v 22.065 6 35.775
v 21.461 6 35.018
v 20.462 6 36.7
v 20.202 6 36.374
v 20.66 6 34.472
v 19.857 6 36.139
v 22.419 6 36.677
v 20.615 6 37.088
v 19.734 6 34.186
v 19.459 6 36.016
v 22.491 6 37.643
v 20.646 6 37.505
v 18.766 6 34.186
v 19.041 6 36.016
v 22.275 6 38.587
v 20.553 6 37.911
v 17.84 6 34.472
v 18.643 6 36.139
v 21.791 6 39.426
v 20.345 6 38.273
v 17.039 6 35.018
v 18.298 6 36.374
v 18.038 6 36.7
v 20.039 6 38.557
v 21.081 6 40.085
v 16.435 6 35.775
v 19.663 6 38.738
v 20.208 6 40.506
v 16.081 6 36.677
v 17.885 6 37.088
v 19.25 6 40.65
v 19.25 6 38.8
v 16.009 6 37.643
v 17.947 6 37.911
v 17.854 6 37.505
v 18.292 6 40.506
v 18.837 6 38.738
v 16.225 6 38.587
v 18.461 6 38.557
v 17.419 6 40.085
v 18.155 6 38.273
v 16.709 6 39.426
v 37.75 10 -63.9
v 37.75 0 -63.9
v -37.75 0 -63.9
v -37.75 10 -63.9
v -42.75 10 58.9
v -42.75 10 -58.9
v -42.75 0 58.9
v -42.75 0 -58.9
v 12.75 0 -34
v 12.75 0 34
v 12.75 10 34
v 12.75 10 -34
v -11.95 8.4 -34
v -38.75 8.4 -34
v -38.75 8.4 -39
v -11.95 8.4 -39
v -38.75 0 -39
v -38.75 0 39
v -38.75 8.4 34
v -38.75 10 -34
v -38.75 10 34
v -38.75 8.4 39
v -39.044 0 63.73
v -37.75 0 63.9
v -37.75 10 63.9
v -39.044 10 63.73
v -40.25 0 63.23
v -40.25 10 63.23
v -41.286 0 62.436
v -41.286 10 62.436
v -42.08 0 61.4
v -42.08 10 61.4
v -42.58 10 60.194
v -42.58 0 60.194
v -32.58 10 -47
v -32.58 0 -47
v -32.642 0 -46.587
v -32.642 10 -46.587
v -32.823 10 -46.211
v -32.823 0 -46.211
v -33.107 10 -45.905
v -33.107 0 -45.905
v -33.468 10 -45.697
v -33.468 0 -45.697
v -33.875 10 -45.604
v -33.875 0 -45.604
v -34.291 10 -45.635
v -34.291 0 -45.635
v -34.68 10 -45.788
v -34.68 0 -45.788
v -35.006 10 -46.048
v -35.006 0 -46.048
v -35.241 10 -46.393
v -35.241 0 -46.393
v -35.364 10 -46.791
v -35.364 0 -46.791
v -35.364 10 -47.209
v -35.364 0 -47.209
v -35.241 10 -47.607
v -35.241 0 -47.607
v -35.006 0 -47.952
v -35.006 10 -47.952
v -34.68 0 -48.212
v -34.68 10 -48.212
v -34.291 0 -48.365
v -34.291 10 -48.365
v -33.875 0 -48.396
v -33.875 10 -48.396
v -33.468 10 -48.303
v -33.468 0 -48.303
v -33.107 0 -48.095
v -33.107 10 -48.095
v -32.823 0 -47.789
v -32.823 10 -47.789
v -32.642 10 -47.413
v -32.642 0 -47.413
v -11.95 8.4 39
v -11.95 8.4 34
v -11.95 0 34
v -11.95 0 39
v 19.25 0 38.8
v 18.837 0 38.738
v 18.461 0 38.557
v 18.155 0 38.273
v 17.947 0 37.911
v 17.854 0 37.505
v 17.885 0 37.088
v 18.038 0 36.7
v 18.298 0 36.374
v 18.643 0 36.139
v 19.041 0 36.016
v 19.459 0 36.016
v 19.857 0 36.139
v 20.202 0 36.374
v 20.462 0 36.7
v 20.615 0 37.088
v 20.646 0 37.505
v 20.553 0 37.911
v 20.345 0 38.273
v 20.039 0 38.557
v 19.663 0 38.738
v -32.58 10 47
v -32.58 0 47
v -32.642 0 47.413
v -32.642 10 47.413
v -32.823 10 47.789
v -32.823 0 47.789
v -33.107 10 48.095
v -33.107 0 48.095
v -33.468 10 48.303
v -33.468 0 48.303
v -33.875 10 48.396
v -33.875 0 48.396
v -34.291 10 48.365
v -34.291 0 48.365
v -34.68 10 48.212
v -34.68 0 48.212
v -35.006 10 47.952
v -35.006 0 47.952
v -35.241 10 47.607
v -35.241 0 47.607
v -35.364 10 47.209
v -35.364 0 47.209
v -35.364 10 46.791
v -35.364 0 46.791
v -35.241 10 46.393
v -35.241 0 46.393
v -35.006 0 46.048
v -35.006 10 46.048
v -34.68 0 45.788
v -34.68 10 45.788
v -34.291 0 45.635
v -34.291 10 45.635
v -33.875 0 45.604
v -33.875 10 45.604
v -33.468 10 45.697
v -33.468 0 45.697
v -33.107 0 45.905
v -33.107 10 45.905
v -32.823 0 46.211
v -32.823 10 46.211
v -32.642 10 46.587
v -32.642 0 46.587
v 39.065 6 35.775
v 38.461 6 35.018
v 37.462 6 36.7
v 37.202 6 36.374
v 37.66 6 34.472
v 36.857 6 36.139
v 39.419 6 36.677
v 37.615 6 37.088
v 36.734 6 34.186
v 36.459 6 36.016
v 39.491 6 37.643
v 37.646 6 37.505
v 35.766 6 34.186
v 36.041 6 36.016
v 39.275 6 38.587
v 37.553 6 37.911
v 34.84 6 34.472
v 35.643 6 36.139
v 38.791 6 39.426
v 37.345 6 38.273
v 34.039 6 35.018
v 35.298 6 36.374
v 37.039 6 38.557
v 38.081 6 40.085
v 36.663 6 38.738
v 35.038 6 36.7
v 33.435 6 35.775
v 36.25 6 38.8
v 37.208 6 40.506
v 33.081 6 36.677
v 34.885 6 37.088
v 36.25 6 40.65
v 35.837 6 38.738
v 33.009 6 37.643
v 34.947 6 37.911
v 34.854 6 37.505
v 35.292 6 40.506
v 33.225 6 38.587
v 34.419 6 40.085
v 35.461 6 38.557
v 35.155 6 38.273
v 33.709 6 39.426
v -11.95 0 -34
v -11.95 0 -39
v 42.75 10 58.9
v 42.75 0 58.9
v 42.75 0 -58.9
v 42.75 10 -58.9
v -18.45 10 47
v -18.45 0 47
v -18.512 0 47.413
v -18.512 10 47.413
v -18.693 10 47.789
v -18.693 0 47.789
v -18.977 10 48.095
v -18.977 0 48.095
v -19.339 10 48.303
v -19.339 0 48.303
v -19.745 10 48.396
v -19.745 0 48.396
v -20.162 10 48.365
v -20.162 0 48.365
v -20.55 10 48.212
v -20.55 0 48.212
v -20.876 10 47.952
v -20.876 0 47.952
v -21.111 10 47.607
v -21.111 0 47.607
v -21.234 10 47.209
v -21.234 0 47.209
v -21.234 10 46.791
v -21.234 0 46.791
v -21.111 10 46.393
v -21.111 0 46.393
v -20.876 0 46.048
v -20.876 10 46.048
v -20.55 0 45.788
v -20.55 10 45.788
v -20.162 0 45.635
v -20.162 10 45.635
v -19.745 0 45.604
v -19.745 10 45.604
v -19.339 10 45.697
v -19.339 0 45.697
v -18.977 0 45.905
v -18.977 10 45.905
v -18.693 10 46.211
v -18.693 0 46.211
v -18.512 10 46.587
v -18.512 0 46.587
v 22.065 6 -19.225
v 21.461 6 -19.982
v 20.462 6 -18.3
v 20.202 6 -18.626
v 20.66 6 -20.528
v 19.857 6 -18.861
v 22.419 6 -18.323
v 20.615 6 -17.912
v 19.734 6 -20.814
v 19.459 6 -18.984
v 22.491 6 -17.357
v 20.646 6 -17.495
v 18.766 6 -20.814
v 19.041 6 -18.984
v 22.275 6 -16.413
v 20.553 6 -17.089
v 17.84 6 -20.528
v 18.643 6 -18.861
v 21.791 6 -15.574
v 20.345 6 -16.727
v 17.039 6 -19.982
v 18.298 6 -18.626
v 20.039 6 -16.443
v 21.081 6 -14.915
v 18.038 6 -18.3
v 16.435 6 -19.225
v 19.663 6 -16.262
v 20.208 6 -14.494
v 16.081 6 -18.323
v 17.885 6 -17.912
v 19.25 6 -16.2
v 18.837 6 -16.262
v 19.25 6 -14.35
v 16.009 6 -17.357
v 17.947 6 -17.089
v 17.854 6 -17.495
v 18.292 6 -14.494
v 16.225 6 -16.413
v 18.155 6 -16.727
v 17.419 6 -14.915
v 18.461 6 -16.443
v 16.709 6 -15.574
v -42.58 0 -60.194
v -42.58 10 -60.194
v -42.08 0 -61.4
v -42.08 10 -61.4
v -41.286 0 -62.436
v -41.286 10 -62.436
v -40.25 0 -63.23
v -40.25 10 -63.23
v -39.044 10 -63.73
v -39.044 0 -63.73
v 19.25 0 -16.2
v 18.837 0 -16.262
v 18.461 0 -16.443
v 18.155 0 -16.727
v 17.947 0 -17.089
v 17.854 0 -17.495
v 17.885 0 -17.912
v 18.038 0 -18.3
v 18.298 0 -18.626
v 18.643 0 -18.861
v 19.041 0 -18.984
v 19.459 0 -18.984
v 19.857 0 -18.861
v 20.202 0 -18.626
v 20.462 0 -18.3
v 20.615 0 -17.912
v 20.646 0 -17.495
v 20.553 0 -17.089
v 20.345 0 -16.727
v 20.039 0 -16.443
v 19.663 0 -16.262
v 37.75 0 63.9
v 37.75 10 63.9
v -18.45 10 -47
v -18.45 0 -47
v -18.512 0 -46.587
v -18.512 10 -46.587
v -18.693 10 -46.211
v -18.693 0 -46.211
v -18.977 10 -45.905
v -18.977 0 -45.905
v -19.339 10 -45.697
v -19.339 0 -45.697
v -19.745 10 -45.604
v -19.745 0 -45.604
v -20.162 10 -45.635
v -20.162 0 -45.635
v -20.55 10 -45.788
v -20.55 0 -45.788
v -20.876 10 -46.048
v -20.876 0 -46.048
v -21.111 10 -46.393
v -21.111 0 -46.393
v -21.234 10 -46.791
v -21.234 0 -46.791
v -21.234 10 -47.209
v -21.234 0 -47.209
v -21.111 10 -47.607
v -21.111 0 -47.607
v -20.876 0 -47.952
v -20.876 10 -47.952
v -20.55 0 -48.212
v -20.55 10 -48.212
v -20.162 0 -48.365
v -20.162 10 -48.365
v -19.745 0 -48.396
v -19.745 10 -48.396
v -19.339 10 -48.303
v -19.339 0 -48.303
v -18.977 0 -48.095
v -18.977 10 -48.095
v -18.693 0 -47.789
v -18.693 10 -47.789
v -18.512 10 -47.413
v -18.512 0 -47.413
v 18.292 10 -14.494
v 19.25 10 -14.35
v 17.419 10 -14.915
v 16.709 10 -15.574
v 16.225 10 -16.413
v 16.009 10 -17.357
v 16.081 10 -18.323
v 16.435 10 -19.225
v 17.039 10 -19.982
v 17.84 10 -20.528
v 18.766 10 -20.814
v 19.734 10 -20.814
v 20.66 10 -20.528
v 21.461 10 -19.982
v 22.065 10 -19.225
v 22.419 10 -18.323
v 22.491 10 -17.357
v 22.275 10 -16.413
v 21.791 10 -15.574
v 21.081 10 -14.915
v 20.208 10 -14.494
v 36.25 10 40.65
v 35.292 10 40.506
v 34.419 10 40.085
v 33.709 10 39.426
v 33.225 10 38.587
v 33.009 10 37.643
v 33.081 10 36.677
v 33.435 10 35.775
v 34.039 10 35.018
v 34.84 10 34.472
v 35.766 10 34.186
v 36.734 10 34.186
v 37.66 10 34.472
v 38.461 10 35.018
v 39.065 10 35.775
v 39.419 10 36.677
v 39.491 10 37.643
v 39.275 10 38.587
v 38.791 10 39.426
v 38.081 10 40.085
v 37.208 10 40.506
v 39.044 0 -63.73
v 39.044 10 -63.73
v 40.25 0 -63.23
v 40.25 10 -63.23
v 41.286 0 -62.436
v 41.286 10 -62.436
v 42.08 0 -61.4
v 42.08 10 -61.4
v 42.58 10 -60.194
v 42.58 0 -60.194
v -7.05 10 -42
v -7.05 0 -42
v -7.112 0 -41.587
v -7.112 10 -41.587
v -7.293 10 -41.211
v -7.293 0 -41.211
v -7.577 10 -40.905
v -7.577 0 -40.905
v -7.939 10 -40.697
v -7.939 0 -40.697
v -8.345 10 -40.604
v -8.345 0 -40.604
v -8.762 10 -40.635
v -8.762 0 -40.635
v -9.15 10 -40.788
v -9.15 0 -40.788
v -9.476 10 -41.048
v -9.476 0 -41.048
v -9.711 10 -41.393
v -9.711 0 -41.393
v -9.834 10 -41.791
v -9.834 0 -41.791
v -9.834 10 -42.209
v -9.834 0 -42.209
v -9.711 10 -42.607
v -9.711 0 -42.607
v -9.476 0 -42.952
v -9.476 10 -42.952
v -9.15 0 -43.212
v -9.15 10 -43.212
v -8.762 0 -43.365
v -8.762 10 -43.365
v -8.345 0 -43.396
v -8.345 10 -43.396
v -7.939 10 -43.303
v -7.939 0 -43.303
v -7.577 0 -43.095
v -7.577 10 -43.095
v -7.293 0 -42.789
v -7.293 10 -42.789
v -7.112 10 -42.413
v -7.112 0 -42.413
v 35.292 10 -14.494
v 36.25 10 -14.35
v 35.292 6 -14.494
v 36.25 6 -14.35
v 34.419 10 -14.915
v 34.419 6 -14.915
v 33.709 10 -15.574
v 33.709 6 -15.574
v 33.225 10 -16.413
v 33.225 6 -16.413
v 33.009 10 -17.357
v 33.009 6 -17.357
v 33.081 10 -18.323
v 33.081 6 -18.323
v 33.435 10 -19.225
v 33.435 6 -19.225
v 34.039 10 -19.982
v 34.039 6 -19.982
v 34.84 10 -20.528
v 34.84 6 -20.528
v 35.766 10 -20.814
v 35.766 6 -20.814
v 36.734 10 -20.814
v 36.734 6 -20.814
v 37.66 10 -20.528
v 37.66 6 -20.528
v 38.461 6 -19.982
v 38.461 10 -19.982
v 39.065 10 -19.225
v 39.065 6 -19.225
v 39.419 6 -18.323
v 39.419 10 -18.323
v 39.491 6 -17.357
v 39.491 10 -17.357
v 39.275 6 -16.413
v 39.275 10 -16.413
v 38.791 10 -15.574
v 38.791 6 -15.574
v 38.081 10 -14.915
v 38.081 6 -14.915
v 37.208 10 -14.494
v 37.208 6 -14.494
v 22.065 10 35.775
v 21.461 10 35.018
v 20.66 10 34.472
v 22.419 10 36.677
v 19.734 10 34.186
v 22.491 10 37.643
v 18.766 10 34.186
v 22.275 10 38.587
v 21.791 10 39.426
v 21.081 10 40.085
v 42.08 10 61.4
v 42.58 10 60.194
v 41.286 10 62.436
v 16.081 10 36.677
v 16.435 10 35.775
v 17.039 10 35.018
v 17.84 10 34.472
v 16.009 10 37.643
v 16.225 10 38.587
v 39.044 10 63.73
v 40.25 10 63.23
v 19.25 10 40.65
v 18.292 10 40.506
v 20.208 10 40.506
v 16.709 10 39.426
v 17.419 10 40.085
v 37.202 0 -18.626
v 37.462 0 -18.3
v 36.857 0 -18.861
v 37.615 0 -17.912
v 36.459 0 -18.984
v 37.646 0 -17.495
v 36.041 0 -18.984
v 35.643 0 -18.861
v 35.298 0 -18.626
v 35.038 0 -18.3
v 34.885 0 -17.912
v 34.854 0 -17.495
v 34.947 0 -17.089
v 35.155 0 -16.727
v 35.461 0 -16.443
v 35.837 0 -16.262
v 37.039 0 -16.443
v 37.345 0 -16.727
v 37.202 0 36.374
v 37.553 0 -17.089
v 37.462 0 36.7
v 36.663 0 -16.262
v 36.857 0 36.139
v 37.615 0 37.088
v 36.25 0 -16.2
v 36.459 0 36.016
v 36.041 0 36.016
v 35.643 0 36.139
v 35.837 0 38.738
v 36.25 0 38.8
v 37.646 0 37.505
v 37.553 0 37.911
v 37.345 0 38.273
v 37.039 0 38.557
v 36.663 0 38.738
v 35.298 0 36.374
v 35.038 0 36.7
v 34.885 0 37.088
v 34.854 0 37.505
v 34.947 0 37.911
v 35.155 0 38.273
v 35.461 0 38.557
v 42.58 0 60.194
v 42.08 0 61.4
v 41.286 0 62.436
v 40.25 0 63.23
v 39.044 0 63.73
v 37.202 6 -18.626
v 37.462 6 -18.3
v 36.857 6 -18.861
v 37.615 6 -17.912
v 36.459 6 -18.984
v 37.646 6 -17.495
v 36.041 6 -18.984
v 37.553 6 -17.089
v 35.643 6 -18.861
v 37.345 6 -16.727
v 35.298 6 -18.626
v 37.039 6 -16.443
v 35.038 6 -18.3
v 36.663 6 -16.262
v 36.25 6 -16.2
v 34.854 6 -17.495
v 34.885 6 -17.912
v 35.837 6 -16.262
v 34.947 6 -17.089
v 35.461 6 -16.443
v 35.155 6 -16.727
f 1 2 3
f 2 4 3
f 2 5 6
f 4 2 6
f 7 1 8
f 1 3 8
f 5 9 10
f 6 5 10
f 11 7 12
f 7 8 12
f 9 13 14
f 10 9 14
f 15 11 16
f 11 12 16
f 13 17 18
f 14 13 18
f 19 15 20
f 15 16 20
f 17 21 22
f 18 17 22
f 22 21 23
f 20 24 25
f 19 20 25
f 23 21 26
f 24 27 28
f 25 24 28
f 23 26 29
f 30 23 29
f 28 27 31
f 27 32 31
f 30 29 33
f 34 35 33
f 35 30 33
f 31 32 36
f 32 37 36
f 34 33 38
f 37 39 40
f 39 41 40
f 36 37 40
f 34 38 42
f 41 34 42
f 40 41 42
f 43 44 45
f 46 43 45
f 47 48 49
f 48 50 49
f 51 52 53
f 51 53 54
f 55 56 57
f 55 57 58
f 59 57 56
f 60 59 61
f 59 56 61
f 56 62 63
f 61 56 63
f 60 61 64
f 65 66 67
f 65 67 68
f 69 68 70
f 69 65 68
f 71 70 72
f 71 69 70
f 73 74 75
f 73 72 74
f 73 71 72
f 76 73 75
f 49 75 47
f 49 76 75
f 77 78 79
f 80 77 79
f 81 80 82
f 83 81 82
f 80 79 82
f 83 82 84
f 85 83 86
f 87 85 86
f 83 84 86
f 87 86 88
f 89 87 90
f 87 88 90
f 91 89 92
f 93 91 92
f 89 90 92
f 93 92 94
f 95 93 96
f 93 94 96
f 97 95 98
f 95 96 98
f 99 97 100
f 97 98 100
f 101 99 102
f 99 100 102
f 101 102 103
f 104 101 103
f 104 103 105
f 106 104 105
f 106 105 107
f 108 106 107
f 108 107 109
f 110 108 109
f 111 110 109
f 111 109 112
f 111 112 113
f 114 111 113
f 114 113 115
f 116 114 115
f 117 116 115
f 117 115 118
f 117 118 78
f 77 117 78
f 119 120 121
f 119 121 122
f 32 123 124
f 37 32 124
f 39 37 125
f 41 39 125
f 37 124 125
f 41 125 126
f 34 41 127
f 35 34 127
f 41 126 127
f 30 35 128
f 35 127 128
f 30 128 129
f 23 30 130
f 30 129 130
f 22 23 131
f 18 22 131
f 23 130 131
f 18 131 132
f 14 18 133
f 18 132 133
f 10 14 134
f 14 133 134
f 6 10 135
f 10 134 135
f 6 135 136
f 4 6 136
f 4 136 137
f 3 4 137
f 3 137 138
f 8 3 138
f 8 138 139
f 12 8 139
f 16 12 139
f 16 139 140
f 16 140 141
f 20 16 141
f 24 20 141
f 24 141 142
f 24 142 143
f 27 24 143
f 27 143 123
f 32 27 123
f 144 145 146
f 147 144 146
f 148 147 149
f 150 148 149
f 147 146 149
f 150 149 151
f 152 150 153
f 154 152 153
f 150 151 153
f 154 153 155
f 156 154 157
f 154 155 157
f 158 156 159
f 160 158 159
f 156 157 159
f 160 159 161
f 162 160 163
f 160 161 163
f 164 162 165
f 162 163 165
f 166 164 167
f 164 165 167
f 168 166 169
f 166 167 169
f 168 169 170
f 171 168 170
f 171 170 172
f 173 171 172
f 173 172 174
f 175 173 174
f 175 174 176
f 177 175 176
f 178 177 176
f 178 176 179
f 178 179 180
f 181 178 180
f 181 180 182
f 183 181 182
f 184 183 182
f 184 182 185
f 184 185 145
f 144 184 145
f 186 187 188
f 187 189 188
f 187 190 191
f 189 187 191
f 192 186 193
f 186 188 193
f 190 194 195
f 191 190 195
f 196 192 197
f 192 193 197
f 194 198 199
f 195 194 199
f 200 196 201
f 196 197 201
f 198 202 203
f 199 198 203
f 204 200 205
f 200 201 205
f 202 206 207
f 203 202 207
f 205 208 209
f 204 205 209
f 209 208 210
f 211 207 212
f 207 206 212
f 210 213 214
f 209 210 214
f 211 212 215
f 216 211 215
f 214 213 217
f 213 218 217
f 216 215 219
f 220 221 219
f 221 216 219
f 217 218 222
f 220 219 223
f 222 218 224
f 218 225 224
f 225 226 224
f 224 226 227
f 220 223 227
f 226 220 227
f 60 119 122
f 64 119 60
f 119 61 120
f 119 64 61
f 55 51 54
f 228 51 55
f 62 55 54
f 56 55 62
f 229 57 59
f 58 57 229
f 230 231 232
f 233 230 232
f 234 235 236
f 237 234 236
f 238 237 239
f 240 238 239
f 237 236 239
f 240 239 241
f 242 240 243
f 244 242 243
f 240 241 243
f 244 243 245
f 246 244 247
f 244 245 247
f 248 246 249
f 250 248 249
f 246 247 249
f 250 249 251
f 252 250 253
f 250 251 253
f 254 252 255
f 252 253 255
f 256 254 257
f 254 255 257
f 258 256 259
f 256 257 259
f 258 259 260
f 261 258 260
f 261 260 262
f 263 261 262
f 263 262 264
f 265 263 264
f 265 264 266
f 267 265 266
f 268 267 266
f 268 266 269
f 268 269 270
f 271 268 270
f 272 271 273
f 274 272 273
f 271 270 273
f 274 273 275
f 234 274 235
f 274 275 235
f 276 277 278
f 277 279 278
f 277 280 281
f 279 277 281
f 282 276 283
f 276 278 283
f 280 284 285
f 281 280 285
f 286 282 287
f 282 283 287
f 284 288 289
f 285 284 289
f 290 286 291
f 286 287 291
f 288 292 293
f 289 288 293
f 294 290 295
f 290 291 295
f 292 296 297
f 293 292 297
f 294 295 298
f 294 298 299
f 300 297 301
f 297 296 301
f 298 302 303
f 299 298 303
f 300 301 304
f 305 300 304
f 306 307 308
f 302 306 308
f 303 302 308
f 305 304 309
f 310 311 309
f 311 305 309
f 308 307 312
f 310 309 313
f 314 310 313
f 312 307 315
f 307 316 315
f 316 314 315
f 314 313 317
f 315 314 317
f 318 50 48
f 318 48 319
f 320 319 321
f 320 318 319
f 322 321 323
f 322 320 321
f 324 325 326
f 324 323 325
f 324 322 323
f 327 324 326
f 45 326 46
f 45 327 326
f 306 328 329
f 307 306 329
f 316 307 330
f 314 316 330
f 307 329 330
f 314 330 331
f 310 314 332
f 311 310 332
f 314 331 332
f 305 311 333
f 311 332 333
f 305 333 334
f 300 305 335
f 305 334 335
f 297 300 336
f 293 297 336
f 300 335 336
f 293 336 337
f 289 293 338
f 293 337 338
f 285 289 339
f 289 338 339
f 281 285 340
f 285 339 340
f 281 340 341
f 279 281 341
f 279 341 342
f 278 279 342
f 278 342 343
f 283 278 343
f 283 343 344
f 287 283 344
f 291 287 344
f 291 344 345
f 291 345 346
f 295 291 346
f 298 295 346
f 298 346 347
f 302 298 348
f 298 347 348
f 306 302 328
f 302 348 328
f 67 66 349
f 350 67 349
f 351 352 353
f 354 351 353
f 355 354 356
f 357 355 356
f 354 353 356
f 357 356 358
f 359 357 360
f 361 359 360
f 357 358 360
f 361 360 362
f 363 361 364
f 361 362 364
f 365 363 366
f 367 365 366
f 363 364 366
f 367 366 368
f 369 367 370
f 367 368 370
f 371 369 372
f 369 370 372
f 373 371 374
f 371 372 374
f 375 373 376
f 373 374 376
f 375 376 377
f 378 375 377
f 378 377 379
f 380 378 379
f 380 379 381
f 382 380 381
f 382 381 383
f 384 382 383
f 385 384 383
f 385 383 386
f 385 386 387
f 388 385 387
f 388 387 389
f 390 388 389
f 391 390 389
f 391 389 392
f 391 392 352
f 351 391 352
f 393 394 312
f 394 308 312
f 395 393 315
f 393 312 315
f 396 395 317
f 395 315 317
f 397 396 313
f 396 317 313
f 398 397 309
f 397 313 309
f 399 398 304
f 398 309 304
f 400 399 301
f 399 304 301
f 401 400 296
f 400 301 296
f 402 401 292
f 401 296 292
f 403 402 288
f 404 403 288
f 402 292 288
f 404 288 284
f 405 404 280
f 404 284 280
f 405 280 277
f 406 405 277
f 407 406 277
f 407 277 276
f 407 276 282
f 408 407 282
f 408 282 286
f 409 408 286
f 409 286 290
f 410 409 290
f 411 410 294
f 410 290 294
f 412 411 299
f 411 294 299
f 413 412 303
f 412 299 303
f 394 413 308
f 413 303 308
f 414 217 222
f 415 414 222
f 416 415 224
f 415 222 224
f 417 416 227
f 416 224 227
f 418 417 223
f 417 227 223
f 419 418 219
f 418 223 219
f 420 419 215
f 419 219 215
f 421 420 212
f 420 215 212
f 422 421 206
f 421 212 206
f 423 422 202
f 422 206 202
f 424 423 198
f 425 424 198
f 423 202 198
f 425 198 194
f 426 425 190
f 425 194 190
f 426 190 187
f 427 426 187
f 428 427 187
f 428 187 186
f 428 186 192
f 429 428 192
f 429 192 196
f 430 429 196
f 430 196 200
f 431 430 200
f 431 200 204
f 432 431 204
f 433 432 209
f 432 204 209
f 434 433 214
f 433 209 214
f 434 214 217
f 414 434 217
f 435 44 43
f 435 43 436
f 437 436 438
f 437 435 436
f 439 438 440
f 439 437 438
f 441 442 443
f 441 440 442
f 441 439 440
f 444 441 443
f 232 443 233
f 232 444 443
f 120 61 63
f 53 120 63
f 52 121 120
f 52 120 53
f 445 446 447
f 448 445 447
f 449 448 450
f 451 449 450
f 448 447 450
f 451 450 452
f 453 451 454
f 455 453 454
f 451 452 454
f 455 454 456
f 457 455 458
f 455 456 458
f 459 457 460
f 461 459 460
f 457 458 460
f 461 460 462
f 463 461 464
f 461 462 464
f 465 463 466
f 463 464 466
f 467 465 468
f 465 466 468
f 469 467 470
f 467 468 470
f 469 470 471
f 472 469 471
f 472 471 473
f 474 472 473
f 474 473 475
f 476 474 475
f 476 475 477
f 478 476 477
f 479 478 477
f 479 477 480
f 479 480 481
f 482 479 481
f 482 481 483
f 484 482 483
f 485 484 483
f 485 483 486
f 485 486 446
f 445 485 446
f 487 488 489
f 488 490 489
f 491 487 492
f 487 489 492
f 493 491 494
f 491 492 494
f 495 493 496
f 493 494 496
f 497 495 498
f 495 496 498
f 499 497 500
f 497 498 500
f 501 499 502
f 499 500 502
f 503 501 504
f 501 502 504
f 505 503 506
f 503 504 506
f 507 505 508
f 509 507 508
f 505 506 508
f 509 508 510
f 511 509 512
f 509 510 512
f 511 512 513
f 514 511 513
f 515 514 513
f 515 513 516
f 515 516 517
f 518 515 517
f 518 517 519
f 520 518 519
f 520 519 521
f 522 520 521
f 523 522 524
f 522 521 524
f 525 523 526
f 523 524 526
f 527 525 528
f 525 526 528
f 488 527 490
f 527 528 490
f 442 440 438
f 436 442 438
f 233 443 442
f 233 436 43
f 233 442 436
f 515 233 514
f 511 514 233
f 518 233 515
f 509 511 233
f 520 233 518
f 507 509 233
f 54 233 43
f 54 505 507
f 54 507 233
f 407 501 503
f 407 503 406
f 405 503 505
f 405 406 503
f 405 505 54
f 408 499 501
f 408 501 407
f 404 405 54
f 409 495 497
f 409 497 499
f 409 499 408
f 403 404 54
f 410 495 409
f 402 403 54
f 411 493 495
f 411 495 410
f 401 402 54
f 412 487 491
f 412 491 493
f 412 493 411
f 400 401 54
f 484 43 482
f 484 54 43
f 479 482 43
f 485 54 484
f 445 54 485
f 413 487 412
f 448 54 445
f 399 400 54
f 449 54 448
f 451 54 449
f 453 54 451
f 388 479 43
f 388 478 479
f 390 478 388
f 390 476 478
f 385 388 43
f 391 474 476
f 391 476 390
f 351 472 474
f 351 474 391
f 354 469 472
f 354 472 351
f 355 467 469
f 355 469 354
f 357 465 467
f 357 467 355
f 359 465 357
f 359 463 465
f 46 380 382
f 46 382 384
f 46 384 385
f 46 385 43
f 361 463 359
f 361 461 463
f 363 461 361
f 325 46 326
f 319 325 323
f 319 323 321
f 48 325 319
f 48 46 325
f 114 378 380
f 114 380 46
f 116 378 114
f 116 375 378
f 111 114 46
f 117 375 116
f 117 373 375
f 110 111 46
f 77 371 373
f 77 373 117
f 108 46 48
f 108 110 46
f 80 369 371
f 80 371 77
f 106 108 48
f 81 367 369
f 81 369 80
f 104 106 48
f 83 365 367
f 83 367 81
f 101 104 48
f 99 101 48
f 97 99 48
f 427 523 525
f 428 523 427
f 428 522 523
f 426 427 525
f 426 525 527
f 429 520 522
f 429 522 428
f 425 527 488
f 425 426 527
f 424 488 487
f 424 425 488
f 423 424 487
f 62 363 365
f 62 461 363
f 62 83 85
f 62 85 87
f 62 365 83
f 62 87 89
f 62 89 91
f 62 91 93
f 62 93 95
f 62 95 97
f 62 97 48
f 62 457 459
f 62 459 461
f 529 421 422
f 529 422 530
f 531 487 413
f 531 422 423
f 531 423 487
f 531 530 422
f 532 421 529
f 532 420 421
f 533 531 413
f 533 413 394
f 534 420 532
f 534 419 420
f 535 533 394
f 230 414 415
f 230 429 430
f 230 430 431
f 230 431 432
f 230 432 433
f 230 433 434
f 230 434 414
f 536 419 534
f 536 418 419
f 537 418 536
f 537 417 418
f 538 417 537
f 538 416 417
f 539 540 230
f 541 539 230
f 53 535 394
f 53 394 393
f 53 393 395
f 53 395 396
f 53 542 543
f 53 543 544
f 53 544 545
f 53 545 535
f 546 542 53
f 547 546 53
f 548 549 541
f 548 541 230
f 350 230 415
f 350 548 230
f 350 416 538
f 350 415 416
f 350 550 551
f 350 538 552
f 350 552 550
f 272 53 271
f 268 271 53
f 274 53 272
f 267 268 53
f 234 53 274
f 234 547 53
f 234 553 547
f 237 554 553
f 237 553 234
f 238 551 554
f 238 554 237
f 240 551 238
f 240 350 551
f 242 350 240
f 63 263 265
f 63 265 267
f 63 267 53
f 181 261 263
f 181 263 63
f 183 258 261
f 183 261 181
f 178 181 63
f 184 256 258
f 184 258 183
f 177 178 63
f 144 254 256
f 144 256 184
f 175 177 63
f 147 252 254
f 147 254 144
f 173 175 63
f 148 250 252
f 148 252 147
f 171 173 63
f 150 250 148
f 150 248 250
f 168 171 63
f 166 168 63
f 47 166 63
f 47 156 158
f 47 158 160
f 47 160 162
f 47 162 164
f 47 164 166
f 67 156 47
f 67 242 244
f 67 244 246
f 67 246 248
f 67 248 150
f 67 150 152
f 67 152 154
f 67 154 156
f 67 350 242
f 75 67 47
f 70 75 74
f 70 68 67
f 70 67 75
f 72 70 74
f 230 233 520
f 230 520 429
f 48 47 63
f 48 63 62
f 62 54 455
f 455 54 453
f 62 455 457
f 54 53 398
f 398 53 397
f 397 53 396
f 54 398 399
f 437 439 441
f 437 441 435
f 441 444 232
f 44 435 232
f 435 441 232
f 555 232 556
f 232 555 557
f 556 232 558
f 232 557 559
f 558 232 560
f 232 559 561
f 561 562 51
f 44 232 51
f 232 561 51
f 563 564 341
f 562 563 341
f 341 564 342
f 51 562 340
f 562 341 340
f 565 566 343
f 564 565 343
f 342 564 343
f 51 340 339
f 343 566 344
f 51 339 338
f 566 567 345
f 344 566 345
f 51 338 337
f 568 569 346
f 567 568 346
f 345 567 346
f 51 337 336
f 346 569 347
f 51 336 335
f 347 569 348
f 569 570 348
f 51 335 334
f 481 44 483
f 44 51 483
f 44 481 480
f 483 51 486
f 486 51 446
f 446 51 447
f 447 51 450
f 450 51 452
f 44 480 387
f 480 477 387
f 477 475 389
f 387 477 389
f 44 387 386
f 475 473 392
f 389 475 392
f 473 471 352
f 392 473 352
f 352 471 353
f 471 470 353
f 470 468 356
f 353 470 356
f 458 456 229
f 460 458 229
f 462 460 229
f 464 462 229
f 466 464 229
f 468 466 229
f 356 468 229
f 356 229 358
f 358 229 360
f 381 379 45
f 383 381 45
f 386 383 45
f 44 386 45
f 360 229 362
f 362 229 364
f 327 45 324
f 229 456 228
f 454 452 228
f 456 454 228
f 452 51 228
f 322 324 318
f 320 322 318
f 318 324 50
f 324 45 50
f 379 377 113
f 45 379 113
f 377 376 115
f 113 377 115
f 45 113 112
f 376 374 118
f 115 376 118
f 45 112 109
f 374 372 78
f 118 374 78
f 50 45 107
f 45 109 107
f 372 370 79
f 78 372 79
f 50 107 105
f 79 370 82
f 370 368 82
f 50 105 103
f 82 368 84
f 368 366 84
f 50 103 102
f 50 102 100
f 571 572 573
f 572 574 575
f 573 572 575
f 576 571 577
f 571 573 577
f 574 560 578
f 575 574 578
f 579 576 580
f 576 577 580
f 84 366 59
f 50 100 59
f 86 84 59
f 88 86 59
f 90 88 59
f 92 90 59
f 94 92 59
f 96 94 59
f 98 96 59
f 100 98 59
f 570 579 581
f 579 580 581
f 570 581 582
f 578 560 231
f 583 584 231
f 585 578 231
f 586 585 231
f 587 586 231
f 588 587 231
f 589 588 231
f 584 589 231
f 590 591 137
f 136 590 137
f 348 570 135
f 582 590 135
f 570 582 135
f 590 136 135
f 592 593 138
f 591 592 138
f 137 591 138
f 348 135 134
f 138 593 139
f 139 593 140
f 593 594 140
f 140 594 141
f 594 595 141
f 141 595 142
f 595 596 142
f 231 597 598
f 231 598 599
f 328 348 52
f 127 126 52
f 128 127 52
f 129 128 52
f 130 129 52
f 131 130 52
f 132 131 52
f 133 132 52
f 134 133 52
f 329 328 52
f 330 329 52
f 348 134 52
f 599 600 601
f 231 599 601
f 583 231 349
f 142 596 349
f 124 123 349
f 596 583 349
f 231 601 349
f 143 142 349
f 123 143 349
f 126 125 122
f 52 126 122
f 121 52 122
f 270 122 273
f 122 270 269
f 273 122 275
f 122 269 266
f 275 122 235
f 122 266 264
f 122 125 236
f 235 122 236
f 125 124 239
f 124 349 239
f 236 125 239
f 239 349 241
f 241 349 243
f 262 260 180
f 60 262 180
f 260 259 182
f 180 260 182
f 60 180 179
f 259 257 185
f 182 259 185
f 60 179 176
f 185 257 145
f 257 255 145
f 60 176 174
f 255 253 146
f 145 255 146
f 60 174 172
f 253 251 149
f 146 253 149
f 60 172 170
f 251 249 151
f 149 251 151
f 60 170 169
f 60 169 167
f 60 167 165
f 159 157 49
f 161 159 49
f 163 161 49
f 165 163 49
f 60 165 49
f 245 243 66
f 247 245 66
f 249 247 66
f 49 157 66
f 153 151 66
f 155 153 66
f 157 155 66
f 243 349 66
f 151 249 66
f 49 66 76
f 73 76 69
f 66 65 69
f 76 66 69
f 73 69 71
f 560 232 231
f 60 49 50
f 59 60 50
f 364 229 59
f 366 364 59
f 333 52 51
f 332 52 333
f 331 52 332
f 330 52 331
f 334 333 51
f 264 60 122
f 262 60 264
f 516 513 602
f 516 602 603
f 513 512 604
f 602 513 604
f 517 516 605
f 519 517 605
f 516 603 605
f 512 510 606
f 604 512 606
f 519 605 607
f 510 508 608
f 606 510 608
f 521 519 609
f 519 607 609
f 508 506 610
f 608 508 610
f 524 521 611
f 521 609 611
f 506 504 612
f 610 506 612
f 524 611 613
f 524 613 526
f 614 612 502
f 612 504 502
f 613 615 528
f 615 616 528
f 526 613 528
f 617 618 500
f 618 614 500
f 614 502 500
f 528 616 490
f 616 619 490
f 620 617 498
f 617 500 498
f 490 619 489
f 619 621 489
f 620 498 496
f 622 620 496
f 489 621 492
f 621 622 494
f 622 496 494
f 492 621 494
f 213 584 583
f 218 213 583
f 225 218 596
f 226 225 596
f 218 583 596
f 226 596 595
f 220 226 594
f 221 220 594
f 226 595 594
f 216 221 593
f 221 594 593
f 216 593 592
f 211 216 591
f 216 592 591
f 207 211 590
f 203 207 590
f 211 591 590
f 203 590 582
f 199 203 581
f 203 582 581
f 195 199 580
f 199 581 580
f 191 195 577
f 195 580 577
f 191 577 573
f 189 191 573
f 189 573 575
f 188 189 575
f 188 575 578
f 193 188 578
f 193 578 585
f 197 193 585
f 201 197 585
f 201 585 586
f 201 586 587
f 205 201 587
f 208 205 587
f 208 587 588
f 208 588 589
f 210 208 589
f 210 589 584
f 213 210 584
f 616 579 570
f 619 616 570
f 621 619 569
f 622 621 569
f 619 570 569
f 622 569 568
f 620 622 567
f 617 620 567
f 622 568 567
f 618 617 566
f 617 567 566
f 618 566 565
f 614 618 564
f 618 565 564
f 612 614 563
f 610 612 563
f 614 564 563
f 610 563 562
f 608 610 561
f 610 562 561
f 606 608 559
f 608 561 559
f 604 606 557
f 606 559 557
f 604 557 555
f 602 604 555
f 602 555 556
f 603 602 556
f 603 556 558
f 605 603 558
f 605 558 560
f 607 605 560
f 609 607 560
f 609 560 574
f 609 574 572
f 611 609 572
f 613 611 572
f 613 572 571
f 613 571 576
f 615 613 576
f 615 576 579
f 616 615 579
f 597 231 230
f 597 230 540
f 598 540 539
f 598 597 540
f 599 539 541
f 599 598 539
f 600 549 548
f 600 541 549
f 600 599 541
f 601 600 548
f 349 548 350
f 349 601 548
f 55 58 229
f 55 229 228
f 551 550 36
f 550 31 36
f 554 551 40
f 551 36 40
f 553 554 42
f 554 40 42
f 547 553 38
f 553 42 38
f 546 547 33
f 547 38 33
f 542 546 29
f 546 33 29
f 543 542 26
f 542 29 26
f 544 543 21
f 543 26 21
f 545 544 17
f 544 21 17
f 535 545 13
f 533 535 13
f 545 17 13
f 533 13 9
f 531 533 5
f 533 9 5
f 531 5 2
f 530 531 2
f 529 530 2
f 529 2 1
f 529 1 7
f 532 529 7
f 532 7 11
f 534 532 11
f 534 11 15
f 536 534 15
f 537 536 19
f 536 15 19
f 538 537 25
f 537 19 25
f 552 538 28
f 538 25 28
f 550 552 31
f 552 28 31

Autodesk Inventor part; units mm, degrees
ref_plane "YZ Plane" through (0, 0, 0) normal (1, 0, 0) x (0, 1, 0)
ref_plane "XZ Plane" through (0, 0, 0) normal (0, 1, 0) x (-1, 0, 0)
sketch "Skizze1" plane through (0, 0, 0) normal (0, 1, 0) x (-1, 0, 0)
  line L0 (-37.75, -63.9) -> (37.75, -63.9)
  line L1 (42.75, -58.9) -> (42.75, 58.9)
  line L2 (37.75, 63.9) -> (-37.75, 63.9)
  line L3 (-42.75, 58.9) -> (-42.75, -58.9)
  line L4 (-42.75, -63.9) -> (42.75, 63.9) construction
  line L5 (42.75, -63.9) -> (-42.75, 63.9) construction
  arc A0 (42.75, 58.9) -> (37.75, 63.9) centre (37.75, 58.9) ccw
  arc A1 (-37.75, 63.9) -> (-42.75, 58.9) centre (-37.75, 58.9) ccw
  arc A2 (-42.75, -58.9) -> (-37.75, -63.9) centre (-37.75, -58.9) ccw
  arc A3 (37.75, -63.9) -> (42.75, -58.9) centre (37.75, -58.9) ccw
  point P0 (0, 0)
  dimension "d0" = 85.5
  dimension "d1" = 127.8
  dimension "d2" = 5
extrude "Extrusion1" add sketch "Skizze1" along normal blind 10
ref_plane "Arbeitsebene1" through (37.75, 0, 0) normal (0, 0, -1) x (-1, 0, 0)
ref_plane "Arbeitsebene2" through (0, 0, 58.9) normal (1, 0, 0) x (0, 0, -1)
sketch "Skizze2" plane through (0, 10, 0) normal (0, 1, 0) x (1, 0, 0)
  line L0 (-12.95, 38) -> (-38.75, 38) projected
  line L1 (-38.75, -38) -> (-12.95, -38) projected
  line L2 (-12.95, -38) -> (-12.95, -2.5) projected
  line L3 (-38.75, 38) -> (-38.75, -38) projected
  line L4 (-38.75, -38) -> (-12.95, -38)
  line L5 (-12.95, -38) -> (-12.95, 38)
  line L6 (-12.95, 38) -> (-38.75, 38)
  line L7 (-38.75, 38) -> (-38.75, -38)
  line L8 (-11.95, 39) -> (-11.95, -39)
  line L9 (-11.95, -39) -> (-39.75, -39)
  line L10 (-39.75, -39) -> (-39.75, 39)
  line L11 (-39.75, 39) -> (-11.95, 39)
  line L12 (-38.75, 38) -> (-38.75, 39)
  line L13 (-38.75, -38) -> (-38.75, -39)
  point P0 (0, 0)
  dimension "d5" = 1
extrude "Extrusion2" cut sketch "Skizze2" against normal through all contours L5 L2 L1 L3 L0 | L0 L12 L11 L8 L9 L13 L1 L2 L5
ref_plane "Arbeitsebene3" through (-32.75, 5, -38) normal (0, 1, 0) x (0, 0, 1)
sketch "Skizze3" plane through (0, 10, 0) normal (0, 1, 0) x (1, 0, 0)
  line L0 (-11.95, -39) -> (-38.75, -39) projected
  line L1 (-38.75, 39) -> (-11.95, 39) projected
  line L2 (-11.95, 39) -> (-11.95, -39) projected
  arc A0 (-37.75, 63.9) -> (-42.75, 58.9) centre (-37.75, 58.9) ccw projected
  line L3 (-42.75, 58.9) -> (-42.75, -58.9) projected
  arc A1 (-42.75, -58.9) -> (-37.75, -63.9) centre (-37.75, -58.9) ccw projected
  line L4 (-37.75, -63.9) -> (37.75, -63.9) projected
  arc A2 (37.75, -63.9) -> (42.75, -58.9) centre (37.75, -58.9) ccw projected
  line L5 (42.75, -58.9) -> (42.75, 58.9) projected
  arc A3 (42.75, 58.9) -> (37.75, 63.9) centre (37.75, 58.9) ccw projected
  line L6 (37.75, 63.9) -> (-37.75, 63.9) projected
  line L7 (-39.75, -39) -> (-39.75, 39) projected
  line L8 (-11.95, 39) -> (-11.95, -39) projected
  line L9 (-39.75, -39) -> (-11.95, -39)
  line L10 (-11.95, -39) -> (-11.95, -34)
  line L11 (-11.95, -34) -> (-39.75, -34)
  line L12 (-39.75, -34) -> (-39.75, -39)
  line L13 (-39.75, 39) -> (-11.95, 39)
  line L14 (-11.95, 39) -> (-11.95, 34)
  line L15 (-11.95, 34) -> (-39.75, 34)
  line L16 (-39.75, 34) -> (-39.75, 39)
  line L17 (-38.75, -39) -> (-38.75, 39) projected
  point P0 (0, 0)
  point P1 (-11.95, -34)
  point P2 (-38.75, 34)
  point P3 (-38.75, -34)
  dimension "d8" = 27.8
  dimension "d9" = 5
  dimension "d10" = 5
extrude "Extrusion3" add sketch "Skizze3" against normal blind 1 contours L0 L17 L11 L2 | L15 L17 L1 L2
sketch "Skizze4" plane through (0, 0, 0) normal (0, -1, 0) x (1, 0, 0)
  line L0 (-38.75, 39) -> (-11.95, 39) projected
  line L1 (-11.95, 39) -> (-11.95, -39) projected
  line L2 (-11.95, -39) -> (-38.75, -39) projected
  arc A0 (-42.75, -58.9) -> (-37.75, -63.9) centre (-37.75, -58.9) ccw projected
  line L3 (37.75, -63.9) -> (-37.75, -63.9) projected
  arc A1 (37.75, -63.9) -> (42.75, -58.9) centre (37.75, -58.9) ccw projected
  line L4 (42.75, 58.9) -> (42.75, -58.9) projected
  arc A2 (42.75, 58.9) -> (37.75, 63.9) centre (37.75, 58.9) ccw projected
  line L5 (-37.75, 63.9) -> (37.75, 63.9) projected
  arc A3 (-37.75, 63.9) -> (-42.75, 58.9) centre (-37.75, 58.9) ccw projected
  line L6 (-42.75, -58.9) -> (-42.75, 58.9) projected
  line L7 (-11.95, -34) -> (-11.95, 34) projected
  line L8 (-11.95, 34) -> (12.75, 34)
  line L9 (12.75, 34) -> (12.75, -34)
  line L10 (12.75, -34) -> (-11.95, -34)
  line L11 (-11.95, -34) -> (-11.95, 34)
  line L12 (-2.45, 7.5) -> (-2.45, -8) projected
  line L13 (12.75, -34.1) -> (12.75, -39.1) projected
  line L14 (-38.75, -39) -> (-38.75, 39) projected
  point P0 (0, 0)
  point P1 (-11.95, -34)
  dimension "d14" = 5
  dimension "d15" = 5
  dimension "d44" = 0
extrude "Extrusion4" cut sketch "Skizze4" against normal through all contours L8 L9 L10 L1
sketch "Skizze5" plane through (0, 0, 0) normal (0, -1, 0) x (1, 0, 0)
  arc A0 (-42.75, -58.9) -> (-37.75, -63.9) centre (-37.75, -58.9) ccw projected
  line L0 (37.75, -63.9) -> (-37.75, -63.9) projected
  arc A1 (37.75, -63.9) -> (42.75, -58.9) centre (37.75, -58.9) ccw projected
  line L1 (42.75, 58.9) -> (42.75, -58.9) projected
  arc A2 (42.75, 58.9) -> (37.75, 63.9) centre (37.75, 58.9) ccw projected
  line L2 (-37.75, 63.9) -> (37.75, 63.9) projected
  arc A3 (-37.75, 63.9) -> (-42.75, 58.9) centre (-37.75, 58.9) ccw projected
  line L3 (-42.75, -58.9) -> (-42.75, 58.9) projected
  line L4 (-11.95, 34) -> (12.75, 34) projected
  line L5 (12.75, 34) -> (12.75, -34) projected
  line L6 (12.75, -34) -> (-11.95, -34) projected
  line L7 (-11.95, -34) -> (-11.95, -39) projected
  line L8 (-11.95, -39) -> (-38.75, -39) projected
  line L9 (-38.75, 39) -> (-11.95, 39) projected
  line L10 (-11.95, 39) -> (-11.95, 34) projected
  circle A4 centre (-19.85, -47) radius 1.4
  circle A5 centre (-19.85, 47) radius 1.4
  line L11 (-38.75, -39) -> (-38.75, 39) projected
  circle A6 centre (-33.9798, 47) radius 1.4
  circle A7 centre (-33.9798, -47) radius 1.4
  circle A8 centre (-8.45, -42) radius 1.4
  point P0 (0, 0)
  dimension "d18" = 2.8
  dimension "d19" = 2.8
  dimension "d20" = 8
  dimension "d21" = 8
  dimension "d45" = 2.8
  dimension "d46" = 2.8
  dimension "d47" = 2.8
  dimension "d48" = 8
  dimension "d49" = 3.5
extrude "Extrusion5" cut sketch "Skizze5" against normal through all contours A4 | A5 | A6 | A7 | A8
sketch "Skizze9" plane through (0, 9, 0) normal (0, -1, 0) x (1, 0, 0)
  circle A0 centre (-19.85, 47) radius 1.4 projected
  circle A1 centre (-19.85, -47) radius 1.4 projected
  arc A2 (-42.75, -58.9) -> (-37.75, -63.9) centre (-37.75, -58.9) ccw projected
  line L0 (37.75, -63.9) -> (-37.75, -63.9) projected
  arc A3 (37.75, -63.9) -> (42.75, -58.9) centre (37.75, -58.9) ccw projected
  line L1 (42.75, 58.9) -> (42.75, -58.9) projected
  arc A4 (42.75, 58.9) -> (37.75, 63.9) centre (37.75, 58.9) ccw projected
  line L2 (-37.75, 63.9) -> (37.75, 63.9) projected
  arc A5 (-37.75, 63.9) -> (-42.75, 58.9) centre (-37.75, 58.9) ccw projected
  line L3 (-42.75, -58.9) -> (-42.75, 58.9) projected
  line L4 (12.75, 34) -> (12.75, -34) projected
  line L5 (12.75, -34) -> (-11.95, -34) projected
  line L6 (-11.95, -34) -> (-11.95, -39) projected
  line L7 (-11.95, -39) -> (-38.75, -39) projected
  line L8 (-38.75, 39) -> (-11.95, 39) projected
  line L9 (-11.95, 39) -> (-11.95, 34) projected
  line L10 (-11.95, 34) -> (12.75, 34) projected
  line L11 (-38.75, 39) -> (-11.95, 39) projected
  line L12 (-39.75, 39) -> (-11.95, 39)
  line L13 (-11.95, 39) -> (-11.95, 34)
  line L14 (-11.95, 34) -> (-39.75, 34)
  line L15 (-39.75, 34) -> (-39.75, 39)
  line L16 (-11.95, -39) -> (-38.75, -39) projected
  line L17 (-39.75, -39) -> (-39.75, -34) projected
  line L18 (-11.95, -39) -> (-39.75, -39)
  line L19 (-39.75, -39) -> (-39.75, -34)
  line L20 (-39.75, -34) -> (-11.95, -34)
  line L21 (-11.95, -34) -> (-11.95, -39)
  line L22 (-38.75, -39) -> (-38.75, 39) projected
  point P0 (0, 0)
  point P1 (-38.75, 34)
  point P2 (-38.75, -34)
extrude "Extrusion8" add sketch "Skizze9" along normal blind 0.6 contours L14 L22 L8 L9 | L6 L7 L22 L20 | L14 L15 L12 L22
sketch "Skizze10" plane through (0, 10, 0) normal (0, 1, 0) x (1, 0, 0)
  line L0 (23.25, -52.9) -> (23.25, 33.1) projected
  line L1 (23.25, -52.9) -> (14.45, -52.9) projected
  line L2 (14.45, -52.9) -> (14.45, 33.1) projected
  line L3 (14.45, 33.1) -> (23.25, 33.1) projected
  circle A0 centre (19.25, -37.4) radius 3.25 projected
  circle A1 centre (19.25, 17.6) radius 3.25 projected
  line L4 (41.05, -52.9) -> (41.05, 33.1) projected
  line L5 (41.05, -52.9) -> (32.25, -52.9) projected
  line L6 (32.25, -52.9) -> (32.25, 33.1) projected
  line L7 (32.25, 33.1) -> (41.05, 33.1) projected
  circle A2 centre (36.25, -37.4) radius 3.25 projected
  circle A3 centre (36.25, 17.6) radius 3.25 projected
  point P0 (0, 0)
hole "Bohrung2" at (36.25, 10, 37.4) at (36.25, 10, -17.6) at (19.25, 10, 37.4) at (19.25, 10, -17.6) direction (0, -1, 0) diameter 2.8 end through all counterbore diameter 6.5 counterbore depth 4
properties part number "TIRFImager_base_v0"
